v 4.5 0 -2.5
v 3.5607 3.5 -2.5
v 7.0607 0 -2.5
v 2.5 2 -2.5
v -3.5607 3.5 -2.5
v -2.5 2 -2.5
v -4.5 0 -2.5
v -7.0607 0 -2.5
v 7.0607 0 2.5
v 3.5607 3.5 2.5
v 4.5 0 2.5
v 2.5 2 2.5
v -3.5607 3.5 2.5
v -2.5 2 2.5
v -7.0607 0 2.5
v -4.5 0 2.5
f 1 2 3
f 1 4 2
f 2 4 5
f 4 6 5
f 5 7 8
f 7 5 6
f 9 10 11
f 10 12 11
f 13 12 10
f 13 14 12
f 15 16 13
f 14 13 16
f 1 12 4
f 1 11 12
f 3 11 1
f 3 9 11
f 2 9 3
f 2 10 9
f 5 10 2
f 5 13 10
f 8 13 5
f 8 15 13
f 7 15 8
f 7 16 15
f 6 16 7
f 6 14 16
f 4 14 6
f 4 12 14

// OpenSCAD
// file: isosceles_trapezoid.scad
module isosceles_trapezoid(d = 5, angle = 45, h = 1, height = 1) {
	bevel_width = h/tan(angle);
	base_width = d + 2*bevel_width;
	scale_x = base_width/d;

	// turn back into 2D primitive
	projection()
		// turn flat on x plane
		rotate([90, 0, 0])
			// move back into center
			translate([0, 0, -h/2])
				// extrude with scaling into trapezoid
				linear_extrude(height = h, scale=[scale_x, 1])
					square([d, 1], center = true);
}

isosceles_trapezoid();
// main file
use <isosceles_trapezoid.scad>;

// derive bevel width from thickness so that actual bevel thickness equals
// thickness
function tie_clip_holder_outer_length(clip_width, angle, thickness) =
	let(bevel_width = sin(angle)*thickness)
	clip_width + 2*bevel_width;

function tie_clip_holder_outer_height(clip_height, thickness) =
	clip_height + thickness;

// allow users to query the base width of the holder so they know what room
// they must make for attaching it somewhere
function tie_clip_holder_base_length(clip_width, clip_height, angle, thickness) =
	let(bevel_width = tie_clip_holder_outer_height(clip_height, thickness)/tan(angle))
	tie_clip_holder_outer_length(clip_width, angle, thickness) + 2*bevel_width;

module tie_clip_holder(holder_width = 5,
		clip_width = 5, clip_height = 2, thickness = 1.5, angle = 45) {
	outer_height = tie_clip_holder_outer_height(clip_height, thickness);

	// move to a zero line in y direction and otherwise in center
	// so we can put it on top of other stuff
	translate([0, outer_height/2, -holder_width/2])
		linear_extrude(holder_width)
			difference() {
				outer_length = tie_clip_holder_outer_length(clip_width,
					angle, thickness);

				// beveled for more technical look and better
				// overhang printing
				isosceles_trapezoid(d = outer_length, h = outer_height,
					angle = angle);
				translate([0, -thickness/2, 0])
					isosceles_trapezoid(d = clip_width,
						h = clip_height, angle = angle);

			}
}

tie_clip_holder();
